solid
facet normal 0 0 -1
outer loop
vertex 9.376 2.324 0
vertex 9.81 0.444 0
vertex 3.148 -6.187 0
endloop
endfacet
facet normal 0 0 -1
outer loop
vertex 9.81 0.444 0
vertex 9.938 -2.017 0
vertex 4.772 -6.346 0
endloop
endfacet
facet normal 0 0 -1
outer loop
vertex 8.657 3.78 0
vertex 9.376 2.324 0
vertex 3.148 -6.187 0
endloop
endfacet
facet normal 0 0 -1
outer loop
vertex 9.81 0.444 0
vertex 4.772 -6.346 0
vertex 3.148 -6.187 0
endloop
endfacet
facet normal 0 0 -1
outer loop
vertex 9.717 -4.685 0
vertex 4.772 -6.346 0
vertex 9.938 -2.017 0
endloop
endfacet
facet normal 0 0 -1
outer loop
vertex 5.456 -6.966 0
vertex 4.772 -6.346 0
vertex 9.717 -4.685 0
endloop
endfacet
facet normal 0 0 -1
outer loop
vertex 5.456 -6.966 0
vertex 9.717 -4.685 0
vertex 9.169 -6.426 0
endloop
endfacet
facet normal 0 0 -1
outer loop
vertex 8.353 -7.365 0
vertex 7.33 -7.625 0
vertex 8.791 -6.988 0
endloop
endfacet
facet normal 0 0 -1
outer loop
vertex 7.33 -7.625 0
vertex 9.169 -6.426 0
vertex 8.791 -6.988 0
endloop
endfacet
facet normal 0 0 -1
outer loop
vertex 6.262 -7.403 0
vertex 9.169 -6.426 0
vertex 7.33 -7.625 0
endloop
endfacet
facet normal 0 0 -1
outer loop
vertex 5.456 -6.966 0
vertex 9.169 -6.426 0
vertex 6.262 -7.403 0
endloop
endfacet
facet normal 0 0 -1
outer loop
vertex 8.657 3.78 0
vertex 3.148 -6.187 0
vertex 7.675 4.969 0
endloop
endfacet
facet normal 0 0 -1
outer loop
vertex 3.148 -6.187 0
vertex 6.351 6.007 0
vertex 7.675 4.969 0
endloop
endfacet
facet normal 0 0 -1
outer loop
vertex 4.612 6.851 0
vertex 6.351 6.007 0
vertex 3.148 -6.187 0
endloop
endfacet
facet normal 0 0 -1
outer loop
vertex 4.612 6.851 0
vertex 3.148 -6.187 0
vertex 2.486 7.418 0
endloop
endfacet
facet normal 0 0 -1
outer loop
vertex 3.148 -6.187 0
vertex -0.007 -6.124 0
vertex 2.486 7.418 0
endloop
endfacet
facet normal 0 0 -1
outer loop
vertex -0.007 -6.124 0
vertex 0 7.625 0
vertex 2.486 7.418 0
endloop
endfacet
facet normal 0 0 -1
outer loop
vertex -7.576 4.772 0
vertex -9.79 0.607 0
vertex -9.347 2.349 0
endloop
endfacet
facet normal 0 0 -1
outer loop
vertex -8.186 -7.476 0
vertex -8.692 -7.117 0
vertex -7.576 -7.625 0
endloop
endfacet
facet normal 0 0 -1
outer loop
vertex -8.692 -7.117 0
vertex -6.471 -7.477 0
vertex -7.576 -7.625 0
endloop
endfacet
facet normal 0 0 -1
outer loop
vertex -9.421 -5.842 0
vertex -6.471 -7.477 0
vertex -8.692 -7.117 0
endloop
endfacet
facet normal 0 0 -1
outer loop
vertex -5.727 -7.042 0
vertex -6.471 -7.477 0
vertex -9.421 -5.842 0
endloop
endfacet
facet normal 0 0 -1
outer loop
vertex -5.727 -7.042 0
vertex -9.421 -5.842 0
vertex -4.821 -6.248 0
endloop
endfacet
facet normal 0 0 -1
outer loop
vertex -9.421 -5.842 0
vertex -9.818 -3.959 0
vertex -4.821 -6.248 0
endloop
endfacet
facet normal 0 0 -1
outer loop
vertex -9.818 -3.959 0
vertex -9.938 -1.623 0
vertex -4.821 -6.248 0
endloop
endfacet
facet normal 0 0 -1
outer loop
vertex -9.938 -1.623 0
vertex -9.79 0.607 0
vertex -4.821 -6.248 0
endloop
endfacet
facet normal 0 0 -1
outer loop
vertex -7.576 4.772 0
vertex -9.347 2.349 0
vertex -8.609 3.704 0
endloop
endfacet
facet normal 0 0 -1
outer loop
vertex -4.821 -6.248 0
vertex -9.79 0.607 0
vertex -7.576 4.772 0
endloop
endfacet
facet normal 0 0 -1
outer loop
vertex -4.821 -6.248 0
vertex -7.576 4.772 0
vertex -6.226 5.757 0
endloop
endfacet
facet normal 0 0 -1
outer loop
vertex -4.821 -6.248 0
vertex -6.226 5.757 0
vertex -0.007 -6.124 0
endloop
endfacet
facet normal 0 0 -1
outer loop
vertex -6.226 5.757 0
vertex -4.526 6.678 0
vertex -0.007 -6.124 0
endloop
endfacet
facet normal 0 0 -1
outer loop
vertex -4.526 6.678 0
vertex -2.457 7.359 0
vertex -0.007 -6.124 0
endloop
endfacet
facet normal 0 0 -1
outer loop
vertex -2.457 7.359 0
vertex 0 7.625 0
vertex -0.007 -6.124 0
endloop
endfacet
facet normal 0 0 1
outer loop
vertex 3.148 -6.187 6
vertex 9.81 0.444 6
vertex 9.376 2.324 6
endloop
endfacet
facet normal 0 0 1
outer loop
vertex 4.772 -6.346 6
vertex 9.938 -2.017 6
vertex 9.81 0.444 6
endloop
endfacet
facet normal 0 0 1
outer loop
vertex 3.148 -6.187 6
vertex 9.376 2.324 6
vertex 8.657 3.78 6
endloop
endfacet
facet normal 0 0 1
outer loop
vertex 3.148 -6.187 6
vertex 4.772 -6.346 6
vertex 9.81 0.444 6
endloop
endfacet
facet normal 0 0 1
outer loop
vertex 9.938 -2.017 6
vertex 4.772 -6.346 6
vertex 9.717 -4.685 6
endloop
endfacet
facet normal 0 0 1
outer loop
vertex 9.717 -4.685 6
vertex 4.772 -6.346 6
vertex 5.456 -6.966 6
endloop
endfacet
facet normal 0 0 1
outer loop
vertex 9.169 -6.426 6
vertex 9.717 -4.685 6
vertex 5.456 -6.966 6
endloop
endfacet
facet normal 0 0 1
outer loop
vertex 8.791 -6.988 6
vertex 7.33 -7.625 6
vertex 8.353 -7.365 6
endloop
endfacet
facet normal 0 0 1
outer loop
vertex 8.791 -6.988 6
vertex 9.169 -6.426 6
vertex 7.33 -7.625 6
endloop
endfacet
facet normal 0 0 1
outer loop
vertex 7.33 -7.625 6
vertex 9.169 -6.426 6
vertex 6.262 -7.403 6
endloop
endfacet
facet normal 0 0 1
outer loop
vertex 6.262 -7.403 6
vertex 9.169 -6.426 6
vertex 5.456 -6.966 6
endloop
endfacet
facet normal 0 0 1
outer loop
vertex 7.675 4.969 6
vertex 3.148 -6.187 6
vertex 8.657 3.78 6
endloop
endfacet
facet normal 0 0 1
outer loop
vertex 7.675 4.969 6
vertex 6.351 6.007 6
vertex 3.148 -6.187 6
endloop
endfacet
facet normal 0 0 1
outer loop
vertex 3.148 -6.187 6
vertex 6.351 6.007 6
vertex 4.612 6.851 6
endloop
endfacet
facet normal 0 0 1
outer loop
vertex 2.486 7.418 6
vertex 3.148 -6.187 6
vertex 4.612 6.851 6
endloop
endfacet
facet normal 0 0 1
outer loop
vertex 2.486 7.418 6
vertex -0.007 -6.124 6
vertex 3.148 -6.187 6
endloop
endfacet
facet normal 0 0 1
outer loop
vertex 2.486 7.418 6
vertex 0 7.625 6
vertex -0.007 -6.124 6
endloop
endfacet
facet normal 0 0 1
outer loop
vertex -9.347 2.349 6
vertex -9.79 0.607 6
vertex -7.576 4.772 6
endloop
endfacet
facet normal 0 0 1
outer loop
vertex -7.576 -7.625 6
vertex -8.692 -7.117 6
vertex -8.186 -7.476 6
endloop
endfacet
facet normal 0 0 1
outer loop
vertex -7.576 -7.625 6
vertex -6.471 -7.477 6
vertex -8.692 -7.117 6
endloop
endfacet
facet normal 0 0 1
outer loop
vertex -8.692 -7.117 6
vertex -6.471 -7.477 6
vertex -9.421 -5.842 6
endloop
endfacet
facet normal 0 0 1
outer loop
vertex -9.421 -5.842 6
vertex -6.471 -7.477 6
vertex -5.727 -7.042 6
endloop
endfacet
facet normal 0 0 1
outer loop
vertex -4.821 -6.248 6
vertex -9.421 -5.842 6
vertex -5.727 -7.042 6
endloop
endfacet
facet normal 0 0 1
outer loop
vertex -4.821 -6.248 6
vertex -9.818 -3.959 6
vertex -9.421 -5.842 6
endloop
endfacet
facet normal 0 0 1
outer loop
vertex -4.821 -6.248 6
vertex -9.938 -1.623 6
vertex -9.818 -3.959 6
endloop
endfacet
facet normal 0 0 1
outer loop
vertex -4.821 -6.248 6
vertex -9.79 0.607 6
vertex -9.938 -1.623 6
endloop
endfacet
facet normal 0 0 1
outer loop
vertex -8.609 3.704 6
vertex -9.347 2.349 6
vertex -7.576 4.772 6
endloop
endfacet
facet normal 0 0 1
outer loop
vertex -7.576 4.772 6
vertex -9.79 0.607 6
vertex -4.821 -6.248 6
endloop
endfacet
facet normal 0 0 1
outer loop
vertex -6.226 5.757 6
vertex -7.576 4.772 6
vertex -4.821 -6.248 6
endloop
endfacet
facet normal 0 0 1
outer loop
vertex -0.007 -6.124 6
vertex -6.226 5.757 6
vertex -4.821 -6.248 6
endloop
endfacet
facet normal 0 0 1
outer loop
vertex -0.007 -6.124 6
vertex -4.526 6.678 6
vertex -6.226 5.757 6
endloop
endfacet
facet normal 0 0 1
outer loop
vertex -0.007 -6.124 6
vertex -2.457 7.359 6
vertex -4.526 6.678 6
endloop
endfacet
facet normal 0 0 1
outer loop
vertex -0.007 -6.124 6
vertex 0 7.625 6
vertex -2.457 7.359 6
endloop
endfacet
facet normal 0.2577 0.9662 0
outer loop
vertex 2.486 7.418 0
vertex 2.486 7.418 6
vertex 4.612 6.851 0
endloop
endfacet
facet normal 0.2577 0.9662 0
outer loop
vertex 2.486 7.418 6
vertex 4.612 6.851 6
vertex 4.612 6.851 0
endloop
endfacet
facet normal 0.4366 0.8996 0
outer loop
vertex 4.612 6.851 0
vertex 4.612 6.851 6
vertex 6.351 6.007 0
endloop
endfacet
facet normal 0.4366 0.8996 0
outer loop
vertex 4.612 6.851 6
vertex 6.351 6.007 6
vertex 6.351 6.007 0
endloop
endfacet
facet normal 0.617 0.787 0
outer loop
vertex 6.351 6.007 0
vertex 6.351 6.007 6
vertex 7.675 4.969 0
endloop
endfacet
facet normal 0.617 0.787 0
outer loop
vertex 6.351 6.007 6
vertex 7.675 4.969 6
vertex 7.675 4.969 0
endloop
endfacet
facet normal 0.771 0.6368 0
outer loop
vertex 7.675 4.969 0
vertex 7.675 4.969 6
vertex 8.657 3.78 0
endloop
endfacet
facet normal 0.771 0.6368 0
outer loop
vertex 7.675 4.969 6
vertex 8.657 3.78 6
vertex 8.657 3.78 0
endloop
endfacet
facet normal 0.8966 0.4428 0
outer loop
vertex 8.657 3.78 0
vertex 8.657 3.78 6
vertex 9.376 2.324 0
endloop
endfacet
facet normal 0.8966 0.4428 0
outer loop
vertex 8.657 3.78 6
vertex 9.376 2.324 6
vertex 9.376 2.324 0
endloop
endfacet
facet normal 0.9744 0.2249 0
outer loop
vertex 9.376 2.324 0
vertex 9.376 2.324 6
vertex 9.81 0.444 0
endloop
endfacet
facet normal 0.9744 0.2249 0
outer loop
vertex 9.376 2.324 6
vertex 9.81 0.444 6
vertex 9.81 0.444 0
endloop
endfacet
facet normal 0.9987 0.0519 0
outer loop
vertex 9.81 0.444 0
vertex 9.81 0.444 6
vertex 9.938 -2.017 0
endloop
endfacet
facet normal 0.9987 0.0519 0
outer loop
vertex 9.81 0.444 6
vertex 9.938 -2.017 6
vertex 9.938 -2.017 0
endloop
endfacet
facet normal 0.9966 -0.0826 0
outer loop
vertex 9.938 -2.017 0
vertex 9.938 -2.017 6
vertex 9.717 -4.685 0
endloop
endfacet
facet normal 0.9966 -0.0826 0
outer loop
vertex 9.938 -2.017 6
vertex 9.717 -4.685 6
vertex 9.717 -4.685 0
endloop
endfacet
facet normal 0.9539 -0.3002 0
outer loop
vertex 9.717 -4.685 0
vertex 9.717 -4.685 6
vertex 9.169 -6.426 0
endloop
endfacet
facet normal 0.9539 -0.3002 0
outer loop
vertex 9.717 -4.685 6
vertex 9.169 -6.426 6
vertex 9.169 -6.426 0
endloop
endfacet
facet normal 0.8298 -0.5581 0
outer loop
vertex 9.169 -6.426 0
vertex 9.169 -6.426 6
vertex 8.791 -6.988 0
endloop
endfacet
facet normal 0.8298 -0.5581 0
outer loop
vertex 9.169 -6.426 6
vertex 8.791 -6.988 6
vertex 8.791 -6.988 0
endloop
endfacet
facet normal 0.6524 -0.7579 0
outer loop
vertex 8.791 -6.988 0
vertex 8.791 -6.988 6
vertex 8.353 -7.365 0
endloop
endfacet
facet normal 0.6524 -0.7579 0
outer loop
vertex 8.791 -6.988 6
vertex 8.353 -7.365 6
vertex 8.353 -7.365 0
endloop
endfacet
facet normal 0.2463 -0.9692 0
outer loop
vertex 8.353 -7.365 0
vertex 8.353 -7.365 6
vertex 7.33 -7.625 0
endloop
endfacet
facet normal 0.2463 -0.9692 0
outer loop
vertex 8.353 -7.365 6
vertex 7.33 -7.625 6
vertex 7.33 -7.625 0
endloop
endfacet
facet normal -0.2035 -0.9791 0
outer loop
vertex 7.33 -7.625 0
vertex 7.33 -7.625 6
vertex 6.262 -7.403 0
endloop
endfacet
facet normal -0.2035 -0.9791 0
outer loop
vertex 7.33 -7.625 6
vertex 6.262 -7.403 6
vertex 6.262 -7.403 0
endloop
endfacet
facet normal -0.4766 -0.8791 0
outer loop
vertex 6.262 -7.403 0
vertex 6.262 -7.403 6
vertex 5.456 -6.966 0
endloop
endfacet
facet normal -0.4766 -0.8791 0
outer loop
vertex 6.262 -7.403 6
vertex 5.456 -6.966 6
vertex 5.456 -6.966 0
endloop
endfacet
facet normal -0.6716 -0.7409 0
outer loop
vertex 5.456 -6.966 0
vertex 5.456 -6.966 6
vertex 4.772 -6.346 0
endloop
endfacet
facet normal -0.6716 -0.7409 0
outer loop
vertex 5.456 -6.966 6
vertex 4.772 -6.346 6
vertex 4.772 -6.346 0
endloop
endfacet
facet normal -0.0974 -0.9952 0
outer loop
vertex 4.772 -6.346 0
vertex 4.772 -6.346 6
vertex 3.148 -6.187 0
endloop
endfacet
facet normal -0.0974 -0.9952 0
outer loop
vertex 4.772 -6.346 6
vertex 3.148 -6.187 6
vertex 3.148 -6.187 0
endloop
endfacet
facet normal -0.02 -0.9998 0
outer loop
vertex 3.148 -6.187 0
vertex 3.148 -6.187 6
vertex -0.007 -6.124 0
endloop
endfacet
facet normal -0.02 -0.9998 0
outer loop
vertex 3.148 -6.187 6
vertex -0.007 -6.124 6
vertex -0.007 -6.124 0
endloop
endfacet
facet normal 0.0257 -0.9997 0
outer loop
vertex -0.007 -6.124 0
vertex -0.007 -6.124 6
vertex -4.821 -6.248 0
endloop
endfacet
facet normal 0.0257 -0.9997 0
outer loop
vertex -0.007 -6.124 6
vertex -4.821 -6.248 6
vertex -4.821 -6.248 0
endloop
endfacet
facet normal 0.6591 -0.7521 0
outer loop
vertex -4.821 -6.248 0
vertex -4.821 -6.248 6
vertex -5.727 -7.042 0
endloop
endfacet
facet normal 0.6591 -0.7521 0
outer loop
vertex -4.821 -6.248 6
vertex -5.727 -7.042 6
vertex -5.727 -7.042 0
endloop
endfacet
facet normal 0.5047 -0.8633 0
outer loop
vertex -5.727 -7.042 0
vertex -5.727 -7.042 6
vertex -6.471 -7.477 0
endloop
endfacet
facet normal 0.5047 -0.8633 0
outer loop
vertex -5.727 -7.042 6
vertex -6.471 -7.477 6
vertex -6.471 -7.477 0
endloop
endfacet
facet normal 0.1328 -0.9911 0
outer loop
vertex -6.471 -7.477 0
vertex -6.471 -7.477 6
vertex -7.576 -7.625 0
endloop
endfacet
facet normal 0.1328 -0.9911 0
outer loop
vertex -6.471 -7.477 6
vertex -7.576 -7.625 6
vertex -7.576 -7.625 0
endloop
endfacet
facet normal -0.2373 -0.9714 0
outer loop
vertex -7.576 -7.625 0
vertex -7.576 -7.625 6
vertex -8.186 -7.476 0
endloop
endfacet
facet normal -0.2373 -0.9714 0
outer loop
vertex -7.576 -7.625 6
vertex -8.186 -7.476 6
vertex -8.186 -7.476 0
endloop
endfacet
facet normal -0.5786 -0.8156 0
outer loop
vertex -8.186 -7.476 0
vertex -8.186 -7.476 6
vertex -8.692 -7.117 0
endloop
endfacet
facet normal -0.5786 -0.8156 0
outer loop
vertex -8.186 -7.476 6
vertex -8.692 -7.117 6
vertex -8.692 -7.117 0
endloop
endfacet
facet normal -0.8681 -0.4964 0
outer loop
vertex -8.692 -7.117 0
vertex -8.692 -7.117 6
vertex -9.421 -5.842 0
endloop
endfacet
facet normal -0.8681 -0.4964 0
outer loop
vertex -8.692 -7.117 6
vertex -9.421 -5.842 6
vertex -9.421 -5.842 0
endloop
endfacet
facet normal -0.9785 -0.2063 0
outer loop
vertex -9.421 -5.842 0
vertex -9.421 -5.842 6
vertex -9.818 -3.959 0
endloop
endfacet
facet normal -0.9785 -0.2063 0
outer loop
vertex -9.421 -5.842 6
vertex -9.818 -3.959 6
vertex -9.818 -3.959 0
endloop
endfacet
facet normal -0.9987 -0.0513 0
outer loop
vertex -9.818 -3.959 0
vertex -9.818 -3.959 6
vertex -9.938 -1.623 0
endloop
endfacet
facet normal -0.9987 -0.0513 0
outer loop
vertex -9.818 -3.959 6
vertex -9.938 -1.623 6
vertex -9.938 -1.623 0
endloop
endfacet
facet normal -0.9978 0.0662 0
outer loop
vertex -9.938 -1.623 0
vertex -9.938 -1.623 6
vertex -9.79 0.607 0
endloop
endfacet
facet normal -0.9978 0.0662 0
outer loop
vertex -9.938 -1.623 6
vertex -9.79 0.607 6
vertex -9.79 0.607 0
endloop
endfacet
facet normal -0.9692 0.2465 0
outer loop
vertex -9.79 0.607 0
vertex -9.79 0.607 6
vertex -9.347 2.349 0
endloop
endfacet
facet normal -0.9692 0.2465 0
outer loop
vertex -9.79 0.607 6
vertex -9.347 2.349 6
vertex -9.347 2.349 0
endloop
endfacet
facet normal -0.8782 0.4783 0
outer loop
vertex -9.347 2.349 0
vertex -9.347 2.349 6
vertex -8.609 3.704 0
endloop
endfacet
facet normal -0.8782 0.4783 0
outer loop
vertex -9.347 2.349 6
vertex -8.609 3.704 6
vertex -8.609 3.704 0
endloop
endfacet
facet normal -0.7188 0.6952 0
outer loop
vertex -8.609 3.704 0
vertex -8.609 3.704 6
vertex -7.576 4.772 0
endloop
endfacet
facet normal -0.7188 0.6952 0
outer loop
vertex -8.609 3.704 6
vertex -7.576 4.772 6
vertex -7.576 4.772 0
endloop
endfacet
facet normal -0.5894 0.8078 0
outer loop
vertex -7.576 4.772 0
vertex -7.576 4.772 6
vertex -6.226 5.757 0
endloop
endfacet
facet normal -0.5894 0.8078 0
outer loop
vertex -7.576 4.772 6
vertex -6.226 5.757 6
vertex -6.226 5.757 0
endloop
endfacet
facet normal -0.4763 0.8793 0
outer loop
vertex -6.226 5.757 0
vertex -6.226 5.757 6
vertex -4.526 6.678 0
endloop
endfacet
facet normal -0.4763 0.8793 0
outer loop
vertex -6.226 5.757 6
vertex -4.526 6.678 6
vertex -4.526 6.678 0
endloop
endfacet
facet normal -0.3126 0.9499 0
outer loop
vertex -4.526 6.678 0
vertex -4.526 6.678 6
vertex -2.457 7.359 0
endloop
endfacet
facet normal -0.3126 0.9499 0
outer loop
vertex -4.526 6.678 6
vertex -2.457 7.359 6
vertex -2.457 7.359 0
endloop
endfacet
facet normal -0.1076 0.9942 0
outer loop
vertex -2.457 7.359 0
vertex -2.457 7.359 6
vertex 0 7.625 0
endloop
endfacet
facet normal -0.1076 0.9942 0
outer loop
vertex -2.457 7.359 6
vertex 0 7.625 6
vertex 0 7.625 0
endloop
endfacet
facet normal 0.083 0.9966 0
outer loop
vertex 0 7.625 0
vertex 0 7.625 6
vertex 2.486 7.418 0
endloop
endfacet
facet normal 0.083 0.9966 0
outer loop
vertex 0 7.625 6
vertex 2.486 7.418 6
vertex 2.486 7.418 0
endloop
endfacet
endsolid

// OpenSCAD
// Module names are of the form poly_<inkscape-path-id>().  As a result,
// you can associate a polygon in this OpenSCAD program with the corresponding
// SVG element in the Inkscape document by looking for the XML element with
// the attribute id="inkscape-path-id".

// fudge value is used to ensure that subtracted solids are a tad taller
// in the z dimension than the polygon being subtracted from.  This helps
// keep the resulting .stl file manifold.
fudge = 0.1;

module poly_path4166(h)
{
  scale([25.4/90, -25.4/90, 1]) union()
  {
    linear_extrude(height=h)
      polygon([[-17.083011,22.138203],[-0.024245,21.698572],[11.155627,21.922933],[16.908705,22.486815],[19.333997,24.682706],[22.186537,26.231884],[25.973161,27.019050],[29.598404,26.095714],[31.148527,24.760762],[32.488243,22.770083],[34.430236,16.600916],[35.211937,7.146972],[34.759421,-1.573925],[33.221483,-8.236127],[30.674133,-13.395019],[27.193380,-17.605984],[22.503179,-21.282969],[16.342179,-24.273584],[8.808435,-26.283669],[0.000001,-27.019067],[-8.704932,-26.076669],[-16.037121,-23.663478],[-22.061934,-20.400493],[-26.844737,-16.908714],[-30.505387,-13.122766],[-33.120137,-8.323610],[-34.688987,-2.151716],[-35.211937,5.752448],[-34.787041,14.027035],[-33.381613,20.700092],[-30.799548,25.215981],[-29.005993,26.491352],[-26.844737,27.019067],[-22.928360,26.494132],[-20.294129,24.951043],[-17.083011,22.138203]]);
  }
}

poly_path4166(6);
